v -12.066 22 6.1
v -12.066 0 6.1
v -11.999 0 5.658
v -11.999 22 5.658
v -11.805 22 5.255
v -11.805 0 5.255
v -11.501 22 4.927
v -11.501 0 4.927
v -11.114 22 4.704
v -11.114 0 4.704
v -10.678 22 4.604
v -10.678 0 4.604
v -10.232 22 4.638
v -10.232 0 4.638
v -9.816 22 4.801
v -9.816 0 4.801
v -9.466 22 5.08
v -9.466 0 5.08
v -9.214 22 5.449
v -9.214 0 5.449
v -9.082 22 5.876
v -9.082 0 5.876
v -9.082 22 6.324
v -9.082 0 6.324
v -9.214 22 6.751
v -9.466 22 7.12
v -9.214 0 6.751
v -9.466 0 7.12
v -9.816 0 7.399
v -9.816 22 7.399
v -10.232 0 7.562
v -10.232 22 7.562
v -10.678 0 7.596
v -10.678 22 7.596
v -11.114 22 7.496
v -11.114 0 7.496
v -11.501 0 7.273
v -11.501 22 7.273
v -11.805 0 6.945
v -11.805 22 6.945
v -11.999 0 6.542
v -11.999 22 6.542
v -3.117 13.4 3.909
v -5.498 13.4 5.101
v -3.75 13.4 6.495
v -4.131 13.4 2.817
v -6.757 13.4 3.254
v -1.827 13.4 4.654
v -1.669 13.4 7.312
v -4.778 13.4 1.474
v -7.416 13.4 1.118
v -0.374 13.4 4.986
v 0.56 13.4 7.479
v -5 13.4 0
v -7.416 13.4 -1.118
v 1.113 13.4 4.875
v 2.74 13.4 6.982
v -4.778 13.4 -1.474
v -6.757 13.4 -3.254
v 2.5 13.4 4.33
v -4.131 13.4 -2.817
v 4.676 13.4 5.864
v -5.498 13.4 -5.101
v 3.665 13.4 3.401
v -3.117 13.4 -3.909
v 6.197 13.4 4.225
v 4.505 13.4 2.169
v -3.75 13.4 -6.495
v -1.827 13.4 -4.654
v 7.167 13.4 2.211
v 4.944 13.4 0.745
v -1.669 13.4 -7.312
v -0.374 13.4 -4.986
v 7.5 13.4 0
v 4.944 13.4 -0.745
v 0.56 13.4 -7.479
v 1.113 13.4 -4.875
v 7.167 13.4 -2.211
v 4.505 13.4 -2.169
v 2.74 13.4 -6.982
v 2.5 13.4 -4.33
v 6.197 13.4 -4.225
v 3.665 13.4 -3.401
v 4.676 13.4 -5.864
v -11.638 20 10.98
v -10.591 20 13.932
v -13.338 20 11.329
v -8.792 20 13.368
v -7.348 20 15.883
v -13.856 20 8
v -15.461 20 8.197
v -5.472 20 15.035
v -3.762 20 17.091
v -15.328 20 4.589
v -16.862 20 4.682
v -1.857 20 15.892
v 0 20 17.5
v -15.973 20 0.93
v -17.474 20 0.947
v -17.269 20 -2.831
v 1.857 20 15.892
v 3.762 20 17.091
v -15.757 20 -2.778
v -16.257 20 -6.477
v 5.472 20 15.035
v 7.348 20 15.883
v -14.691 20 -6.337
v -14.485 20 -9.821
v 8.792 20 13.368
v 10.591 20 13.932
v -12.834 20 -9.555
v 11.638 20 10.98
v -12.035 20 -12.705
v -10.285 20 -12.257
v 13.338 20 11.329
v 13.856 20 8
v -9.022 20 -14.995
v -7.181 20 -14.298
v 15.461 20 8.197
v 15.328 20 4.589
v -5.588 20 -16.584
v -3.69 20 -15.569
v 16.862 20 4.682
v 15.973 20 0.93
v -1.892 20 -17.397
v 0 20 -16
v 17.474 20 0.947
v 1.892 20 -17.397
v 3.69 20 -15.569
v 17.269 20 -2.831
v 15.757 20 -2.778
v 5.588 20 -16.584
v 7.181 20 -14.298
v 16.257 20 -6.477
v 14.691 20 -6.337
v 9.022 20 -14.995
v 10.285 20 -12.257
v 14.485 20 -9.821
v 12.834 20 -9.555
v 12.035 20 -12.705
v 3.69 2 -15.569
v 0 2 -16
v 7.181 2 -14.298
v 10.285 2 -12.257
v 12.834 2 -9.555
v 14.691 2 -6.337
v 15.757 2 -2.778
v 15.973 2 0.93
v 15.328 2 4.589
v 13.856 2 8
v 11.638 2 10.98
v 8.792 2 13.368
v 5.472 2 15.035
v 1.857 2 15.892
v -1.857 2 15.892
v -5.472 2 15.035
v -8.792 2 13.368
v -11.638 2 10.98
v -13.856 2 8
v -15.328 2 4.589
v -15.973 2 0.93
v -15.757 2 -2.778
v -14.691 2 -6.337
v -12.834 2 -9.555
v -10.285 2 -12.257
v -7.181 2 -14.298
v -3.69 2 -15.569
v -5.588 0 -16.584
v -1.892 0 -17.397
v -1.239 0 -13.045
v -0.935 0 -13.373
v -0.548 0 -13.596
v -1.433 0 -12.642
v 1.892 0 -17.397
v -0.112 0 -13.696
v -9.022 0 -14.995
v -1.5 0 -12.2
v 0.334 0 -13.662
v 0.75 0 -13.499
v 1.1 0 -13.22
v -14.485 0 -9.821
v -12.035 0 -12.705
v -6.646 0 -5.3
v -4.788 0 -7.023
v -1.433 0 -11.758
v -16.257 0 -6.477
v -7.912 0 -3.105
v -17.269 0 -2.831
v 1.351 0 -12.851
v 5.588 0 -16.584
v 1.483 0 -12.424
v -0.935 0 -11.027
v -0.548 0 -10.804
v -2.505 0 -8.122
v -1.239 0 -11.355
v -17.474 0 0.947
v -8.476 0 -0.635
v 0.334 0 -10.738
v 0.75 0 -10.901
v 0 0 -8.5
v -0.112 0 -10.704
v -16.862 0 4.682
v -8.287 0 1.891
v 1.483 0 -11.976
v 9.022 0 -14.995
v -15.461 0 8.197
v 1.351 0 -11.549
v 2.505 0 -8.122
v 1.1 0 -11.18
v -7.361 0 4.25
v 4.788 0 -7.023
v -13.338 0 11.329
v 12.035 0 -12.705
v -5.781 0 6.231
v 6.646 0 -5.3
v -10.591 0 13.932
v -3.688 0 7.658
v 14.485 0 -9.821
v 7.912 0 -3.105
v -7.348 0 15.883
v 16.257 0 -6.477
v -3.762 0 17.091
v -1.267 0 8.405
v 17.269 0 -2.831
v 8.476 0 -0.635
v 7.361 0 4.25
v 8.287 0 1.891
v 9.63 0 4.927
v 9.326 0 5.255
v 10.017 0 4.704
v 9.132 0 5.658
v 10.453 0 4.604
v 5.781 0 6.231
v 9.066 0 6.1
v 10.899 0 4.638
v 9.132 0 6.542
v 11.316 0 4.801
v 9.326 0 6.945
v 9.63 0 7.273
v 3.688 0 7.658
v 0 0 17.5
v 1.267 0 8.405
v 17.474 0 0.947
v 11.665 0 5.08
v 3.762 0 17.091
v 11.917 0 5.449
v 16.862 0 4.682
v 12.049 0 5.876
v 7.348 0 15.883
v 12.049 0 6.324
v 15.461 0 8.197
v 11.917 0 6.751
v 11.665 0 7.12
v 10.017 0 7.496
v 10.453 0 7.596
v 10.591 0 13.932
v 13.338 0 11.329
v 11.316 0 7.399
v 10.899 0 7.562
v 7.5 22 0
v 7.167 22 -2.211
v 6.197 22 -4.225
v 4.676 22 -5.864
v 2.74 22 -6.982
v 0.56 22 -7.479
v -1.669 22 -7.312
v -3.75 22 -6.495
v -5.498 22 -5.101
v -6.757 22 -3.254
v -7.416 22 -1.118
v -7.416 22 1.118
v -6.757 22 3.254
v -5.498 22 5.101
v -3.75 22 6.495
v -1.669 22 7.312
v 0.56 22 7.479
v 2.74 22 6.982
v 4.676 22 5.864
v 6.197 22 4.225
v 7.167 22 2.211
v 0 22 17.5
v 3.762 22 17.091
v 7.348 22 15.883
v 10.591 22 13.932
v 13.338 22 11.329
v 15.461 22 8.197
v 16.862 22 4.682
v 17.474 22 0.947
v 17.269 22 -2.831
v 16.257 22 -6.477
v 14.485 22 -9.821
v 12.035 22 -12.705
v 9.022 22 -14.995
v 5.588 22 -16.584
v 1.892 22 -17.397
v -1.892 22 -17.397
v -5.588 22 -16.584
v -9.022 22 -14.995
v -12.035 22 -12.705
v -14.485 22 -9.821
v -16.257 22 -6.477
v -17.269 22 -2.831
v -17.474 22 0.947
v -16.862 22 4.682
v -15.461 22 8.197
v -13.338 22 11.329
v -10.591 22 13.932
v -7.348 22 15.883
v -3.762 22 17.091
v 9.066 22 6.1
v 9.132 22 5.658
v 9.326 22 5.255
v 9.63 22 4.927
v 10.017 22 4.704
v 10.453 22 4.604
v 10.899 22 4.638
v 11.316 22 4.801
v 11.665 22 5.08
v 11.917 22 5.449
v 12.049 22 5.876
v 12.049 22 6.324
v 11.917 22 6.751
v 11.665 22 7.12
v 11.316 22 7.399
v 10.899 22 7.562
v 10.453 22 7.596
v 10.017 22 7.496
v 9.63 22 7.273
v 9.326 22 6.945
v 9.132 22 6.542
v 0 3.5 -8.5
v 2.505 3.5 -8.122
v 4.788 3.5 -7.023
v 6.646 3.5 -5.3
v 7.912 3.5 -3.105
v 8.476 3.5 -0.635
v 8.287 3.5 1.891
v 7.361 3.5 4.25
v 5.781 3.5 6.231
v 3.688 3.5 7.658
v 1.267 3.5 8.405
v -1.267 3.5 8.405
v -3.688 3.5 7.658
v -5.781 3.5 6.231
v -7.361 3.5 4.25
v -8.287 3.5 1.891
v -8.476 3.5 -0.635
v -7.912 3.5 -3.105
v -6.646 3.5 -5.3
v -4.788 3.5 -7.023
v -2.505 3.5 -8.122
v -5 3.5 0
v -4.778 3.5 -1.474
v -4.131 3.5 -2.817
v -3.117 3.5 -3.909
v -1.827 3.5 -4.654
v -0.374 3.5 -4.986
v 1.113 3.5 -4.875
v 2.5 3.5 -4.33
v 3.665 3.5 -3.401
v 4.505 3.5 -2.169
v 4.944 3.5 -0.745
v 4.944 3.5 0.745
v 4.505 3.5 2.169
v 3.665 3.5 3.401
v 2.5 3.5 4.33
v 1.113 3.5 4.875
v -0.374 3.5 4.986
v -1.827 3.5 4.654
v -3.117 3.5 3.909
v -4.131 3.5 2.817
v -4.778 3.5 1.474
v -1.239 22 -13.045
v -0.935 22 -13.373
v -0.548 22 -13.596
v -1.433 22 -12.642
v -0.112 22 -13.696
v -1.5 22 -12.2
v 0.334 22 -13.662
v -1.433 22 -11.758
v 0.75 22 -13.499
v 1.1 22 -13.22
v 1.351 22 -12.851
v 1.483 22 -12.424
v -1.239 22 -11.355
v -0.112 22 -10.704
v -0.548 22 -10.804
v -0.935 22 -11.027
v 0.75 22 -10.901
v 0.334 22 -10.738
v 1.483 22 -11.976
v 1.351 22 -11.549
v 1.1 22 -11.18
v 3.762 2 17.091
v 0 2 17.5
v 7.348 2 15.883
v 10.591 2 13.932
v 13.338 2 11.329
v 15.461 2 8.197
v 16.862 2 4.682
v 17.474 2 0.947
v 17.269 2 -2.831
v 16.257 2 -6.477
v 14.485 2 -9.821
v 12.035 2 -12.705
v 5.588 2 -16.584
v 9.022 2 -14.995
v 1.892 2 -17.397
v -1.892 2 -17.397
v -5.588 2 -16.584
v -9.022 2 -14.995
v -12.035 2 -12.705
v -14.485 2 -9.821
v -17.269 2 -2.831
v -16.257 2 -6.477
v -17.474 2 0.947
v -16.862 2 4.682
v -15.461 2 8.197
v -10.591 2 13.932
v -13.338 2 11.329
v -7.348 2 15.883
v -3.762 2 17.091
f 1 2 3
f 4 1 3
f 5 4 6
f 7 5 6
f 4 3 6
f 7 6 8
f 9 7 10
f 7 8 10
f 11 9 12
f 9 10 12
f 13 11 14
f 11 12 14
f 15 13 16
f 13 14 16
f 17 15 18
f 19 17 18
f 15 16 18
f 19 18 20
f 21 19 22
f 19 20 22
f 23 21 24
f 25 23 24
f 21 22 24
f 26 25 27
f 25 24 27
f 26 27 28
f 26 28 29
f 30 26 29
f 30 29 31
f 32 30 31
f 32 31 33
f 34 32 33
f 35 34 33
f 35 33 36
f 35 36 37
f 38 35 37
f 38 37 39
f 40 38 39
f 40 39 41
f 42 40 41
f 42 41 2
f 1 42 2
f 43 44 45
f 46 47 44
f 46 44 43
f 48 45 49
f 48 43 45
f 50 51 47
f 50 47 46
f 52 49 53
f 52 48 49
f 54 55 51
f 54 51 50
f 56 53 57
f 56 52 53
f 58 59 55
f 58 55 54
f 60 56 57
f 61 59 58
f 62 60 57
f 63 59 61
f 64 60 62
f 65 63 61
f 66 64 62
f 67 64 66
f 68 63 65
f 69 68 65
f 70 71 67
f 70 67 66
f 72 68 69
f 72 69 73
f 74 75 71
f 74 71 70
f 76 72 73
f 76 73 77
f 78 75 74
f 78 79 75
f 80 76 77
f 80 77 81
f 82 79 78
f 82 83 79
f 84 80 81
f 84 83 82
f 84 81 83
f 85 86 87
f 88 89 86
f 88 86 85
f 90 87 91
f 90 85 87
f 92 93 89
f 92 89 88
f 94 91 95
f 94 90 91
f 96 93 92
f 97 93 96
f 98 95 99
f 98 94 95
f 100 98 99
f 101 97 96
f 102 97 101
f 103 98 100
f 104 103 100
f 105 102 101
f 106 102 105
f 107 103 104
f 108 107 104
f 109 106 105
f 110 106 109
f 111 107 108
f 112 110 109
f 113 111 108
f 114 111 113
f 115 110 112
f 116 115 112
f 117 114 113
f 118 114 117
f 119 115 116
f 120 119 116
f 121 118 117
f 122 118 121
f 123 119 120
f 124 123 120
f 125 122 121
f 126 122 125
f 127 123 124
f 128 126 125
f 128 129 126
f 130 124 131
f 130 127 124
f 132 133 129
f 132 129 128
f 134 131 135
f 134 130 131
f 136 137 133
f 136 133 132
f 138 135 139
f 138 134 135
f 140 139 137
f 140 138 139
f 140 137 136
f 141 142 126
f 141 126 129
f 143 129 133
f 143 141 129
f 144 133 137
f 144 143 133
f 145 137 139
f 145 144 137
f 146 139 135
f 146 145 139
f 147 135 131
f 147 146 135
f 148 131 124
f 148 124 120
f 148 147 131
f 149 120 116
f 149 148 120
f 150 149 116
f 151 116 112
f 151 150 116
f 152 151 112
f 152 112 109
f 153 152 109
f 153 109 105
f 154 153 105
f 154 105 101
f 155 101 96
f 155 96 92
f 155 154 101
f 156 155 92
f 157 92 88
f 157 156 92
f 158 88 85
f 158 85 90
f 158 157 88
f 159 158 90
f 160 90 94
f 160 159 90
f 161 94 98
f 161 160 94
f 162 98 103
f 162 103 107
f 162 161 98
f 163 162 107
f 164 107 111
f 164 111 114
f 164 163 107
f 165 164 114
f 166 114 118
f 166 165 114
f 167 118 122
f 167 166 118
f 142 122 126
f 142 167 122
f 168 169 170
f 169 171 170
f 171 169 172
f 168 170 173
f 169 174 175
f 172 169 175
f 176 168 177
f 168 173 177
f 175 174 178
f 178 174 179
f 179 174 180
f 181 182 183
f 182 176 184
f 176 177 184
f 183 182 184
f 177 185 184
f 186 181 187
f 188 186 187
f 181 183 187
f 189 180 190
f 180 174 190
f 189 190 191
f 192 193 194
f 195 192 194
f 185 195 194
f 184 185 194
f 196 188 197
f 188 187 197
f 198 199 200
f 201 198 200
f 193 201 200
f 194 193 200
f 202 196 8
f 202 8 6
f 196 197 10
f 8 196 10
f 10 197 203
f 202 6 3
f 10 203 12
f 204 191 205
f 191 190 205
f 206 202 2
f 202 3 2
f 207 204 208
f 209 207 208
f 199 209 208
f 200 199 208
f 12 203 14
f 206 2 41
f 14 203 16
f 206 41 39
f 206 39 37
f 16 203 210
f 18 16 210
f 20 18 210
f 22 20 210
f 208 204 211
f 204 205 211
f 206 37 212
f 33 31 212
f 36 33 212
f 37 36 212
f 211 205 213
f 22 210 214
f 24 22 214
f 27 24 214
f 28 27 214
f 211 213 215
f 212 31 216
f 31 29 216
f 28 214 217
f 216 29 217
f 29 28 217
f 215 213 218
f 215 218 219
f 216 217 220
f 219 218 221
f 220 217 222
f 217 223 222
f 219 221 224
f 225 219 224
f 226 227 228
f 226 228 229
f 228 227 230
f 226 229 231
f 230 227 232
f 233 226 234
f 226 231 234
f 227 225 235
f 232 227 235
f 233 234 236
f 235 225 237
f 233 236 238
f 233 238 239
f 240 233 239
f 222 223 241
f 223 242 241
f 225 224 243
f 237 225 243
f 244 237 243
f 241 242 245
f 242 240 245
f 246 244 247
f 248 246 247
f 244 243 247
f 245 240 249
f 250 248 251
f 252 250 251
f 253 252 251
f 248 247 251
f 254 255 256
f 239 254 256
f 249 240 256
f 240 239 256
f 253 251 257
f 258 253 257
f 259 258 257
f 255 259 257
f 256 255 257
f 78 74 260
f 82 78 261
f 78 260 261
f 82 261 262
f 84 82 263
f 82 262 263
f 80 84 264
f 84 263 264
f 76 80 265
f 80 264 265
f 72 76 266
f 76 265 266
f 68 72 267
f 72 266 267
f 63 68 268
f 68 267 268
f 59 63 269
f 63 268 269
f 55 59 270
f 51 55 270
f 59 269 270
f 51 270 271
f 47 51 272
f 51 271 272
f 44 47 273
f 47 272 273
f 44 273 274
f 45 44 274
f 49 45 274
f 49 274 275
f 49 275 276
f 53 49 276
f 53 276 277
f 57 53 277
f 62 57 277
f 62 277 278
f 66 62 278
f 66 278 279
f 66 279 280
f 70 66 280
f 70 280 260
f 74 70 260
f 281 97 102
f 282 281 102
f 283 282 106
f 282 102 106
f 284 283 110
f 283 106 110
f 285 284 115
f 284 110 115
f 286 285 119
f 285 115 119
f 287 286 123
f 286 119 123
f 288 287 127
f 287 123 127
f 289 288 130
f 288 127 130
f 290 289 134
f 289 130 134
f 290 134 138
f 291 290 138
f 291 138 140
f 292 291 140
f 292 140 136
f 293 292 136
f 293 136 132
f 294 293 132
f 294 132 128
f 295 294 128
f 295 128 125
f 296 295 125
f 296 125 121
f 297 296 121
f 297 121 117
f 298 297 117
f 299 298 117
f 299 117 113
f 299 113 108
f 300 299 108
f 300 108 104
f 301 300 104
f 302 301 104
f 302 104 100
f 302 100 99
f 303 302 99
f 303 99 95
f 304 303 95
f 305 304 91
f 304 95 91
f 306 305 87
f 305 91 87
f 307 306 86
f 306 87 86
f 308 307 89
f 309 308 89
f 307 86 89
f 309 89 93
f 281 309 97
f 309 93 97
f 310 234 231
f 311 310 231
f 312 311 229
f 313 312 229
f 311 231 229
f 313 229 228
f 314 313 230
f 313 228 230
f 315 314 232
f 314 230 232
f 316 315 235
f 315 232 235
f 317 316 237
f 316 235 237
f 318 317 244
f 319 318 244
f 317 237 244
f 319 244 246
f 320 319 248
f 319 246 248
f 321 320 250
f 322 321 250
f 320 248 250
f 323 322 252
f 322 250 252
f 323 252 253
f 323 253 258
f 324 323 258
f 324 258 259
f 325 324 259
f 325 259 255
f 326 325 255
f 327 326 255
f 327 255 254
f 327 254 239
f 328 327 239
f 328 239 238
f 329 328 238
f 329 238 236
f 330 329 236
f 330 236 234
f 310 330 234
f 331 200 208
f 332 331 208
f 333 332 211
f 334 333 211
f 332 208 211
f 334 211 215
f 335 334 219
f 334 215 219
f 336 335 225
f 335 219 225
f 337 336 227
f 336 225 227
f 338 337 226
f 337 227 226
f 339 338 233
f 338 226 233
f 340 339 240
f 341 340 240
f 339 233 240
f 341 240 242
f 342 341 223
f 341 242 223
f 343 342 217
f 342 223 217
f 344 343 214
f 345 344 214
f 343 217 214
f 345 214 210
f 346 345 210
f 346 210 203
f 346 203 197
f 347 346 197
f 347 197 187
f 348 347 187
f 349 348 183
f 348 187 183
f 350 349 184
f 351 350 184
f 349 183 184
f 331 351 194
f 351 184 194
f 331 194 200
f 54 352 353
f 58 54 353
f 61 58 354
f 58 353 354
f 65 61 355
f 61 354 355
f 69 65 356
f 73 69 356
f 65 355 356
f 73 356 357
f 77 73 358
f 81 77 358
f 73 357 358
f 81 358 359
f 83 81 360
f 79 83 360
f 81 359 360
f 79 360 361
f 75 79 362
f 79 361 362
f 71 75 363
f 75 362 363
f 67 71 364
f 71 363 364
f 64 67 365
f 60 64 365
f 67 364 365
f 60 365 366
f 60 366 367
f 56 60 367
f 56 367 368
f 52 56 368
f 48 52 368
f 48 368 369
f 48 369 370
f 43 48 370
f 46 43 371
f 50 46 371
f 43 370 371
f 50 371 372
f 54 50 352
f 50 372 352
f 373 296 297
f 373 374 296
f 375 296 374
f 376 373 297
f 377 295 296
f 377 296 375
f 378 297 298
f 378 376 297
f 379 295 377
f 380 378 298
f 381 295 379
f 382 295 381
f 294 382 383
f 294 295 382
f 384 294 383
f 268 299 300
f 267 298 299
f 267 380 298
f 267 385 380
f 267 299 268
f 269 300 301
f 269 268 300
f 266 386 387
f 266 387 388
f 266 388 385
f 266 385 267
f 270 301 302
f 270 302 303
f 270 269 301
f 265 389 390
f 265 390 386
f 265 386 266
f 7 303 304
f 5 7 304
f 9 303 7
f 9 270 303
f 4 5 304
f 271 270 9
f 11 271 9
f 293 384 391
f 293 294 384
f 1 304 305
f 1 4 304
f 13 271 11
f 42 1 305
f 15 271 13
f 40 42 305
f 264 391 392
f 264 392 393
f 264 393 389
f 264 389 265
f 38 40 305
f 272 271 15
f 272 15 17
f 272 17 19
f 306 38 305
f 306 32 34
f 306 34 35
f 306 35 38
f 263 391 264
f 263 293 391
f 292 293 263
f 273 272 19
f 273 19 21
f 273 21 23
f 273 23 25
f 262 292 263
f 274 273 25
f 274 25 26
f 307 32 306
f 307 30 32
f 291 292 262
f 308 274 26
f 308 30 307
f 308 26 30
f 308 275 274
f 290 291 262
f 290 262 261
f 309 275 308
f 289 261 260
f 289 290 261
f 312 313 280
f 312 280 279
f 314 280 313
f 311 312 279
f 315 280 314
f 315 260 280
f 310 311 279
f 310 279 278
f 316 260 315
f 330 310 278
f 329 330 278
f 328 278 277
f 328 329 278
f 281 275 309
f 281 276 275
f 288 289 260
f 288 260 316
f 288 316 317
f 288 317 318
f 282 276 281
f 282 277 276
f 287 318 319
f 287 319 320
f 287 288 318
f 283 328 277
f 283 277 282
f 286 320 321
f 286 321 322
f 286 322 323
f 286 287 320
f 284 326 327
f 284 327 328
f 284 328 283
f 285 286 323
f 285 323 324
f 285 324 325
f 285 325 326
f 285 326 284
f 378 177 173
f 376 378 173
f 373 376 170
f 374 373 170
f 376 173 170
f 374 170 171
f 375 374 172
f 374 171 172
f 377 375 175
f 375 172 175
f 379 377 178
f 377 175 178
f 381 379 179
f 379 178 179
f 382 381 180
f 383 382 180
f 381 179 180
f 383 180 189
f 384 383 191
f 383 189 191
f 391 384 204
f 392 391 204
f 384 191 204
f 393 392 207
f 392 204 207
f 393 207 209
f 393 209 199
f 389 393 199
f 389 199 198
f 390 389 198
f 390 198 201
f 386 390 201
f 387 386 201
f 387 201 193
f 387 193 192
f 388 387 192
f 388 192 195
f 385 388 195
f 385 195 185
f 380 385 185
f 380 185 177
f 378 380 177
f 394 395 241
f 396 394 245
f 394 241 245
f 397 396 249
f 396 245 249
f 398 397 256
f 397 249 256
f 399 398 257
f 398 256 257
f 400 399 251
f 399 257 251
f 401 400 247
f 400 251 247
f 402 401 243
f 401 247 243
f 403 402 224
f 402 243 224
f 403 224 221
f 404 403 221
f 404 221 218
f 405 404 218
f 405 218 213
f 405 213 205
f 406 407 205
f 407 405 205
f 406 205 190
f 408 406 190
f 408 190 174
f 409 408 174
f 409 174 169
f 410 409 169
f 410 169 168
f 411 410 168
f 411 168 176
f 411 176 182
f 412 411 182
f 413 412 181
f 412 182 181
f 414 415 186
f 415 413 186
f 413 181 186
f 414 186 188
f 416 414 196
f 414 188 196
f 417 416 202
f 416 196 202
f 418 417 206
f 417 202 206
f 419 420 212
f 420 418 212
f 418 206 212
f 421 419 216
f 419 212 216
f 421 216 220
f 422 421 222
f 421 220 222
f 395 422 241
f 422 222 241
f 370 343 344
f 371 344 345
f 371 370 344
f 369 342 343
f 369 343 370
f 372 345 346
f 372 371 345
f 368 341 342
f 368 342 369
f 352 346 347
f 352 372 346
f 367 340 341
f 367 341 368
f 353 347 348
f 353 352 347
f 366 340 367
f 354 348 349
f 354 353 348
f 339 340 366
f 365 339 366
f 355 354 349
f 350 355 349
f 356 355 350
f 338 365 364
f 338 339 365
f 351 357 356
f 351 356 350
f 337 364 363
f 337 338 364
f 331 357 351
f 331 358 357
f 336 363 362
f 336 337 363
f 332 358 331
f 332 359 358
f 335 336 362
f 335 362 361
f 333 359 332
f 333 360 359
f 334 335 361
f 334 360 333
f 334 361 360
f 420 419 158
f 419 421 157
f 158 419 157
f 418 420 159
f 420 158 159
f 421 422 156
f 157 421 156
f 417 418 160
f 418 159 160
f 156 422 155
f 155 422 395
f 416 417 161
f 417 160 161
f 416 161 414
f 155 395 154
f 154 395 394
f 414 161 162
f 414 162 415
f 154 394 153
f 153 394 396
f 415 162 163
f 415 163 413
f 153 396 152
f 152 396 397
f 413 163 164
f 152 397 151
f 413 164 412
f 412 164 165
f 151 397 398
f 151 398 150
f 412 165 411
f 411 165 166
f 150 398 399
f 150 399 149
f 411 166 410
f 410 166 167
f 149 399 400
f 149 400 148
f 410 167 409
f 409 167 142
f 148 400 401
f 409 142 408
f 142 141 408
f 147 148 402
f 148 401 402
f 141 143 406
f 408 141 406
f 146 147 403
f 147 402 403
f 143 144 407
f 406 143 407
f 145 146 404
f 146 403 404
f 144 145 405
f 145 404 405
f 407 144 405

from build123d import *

# Parameters (mm, degrees)
SKETCH1_R                                           = 17.5
BOSS_EXTRUDE1_DEPTH                                 = 22
CBORE_FOR_M8_HEX_SOCKET_HEAD_CAP_SCREW1_D           = 10
CBORE_FOR_M8_HEX_SOCKET_HEAD_CAP_SCREW1_CBORE_D     = 15
CBORE_FOR_M8_HEX_SOCKET_HEAD_CAP_SCREW1_CBORE_DEPTH = 8.6
F_3_0MM_DOWEL_HOLE1_D                               = 3
SKETCH6_R                                           = 8.5
CUT_EXTRUDE1_DEPTH                                  = 3.5
CUT_EXTRUDE2_START                                  = -2
SKETCH7_R                                           = 17.5
SKETCH7_R_2                                         = 16
CUT_EXTRUDE2_DEPTH                                  = 18


with BuildPart() as part:
    # Sketch1 → Boss-Extrude1 (new body)
    with BuildSketch(Plane(origin=(0, 0, 0), x_dir=(1, 0, 0), z_dir=(0, 1, 0))):
        with Locations(Location((0, 0, 0), (0, 0, 270))):
            Circle(SKETCH1_R)
    extrude(amount=BOSS_EXTRUDE1_DEPTH)

    # CBORE for M8 Hex Socket Head Cap Screw1 (through all)
    with Locations(Plane(origin=(0, 22, 0), x_dir=(1, 0, 0), z_dir=(0, 1, 0))):
        with Locations((0, 0)):
            CounterBoreHole(CBORE_FOR_M8_HEX_SOCKET_HEAD_CAP_SCREW1_D / 2, CBORE_FOR_M8_HEX_SOCKET_HEAD_CAP_SCREW1_CBORE_D / 2, CBORE_FOR_M8_HEX_SOCKET_HEAD_CAP_SCREW1_CBORE_DEPTH)

    # Ø3.0mm Dowel Hole1 (through all)
    with Locations(Plane(origin=(0, 22, 0), x_dir=(1, 0, 0), z_dir=(0, 1, 0))):
        with Locations((-10.565509926, -6.1), (0, 12.2), (10.565509926, -6.1)):
            Hole(F_3_0MM_DOWEL_HOLE1_D / 2)

    # Sketch6 → Cut-Extrude1 (cut)
    with BuildSketch(Plane.XZ):
        with Locations(Location((0, 0, 0), (0, 0, 270))):
            Circle(SKETCH6_R)
    extrude(amount=-CUT_EXTRUDE1_DEPTH, mode=Mode.SUBTRACT)

    # Sketch7 → Cut-Extrude2 (cut)
    with BuildSketch(Plane.XZ.offset(CUT_EXTRUDE2_START)):
        with Locations(Location((0, 0, 0), (0, 0, 270))):
            Circle(SKETCH7_R)
        with Locations(Location((0, 0, 0), (0, 0, 270))):
            Circle(SKETCH7_R_2, mode=Mode.SUBTRACT)
    extrude(amount=-CUT_EXTRUDE2_DEPTH, mode=Mode.SUBTRACT)


solid = part.part
